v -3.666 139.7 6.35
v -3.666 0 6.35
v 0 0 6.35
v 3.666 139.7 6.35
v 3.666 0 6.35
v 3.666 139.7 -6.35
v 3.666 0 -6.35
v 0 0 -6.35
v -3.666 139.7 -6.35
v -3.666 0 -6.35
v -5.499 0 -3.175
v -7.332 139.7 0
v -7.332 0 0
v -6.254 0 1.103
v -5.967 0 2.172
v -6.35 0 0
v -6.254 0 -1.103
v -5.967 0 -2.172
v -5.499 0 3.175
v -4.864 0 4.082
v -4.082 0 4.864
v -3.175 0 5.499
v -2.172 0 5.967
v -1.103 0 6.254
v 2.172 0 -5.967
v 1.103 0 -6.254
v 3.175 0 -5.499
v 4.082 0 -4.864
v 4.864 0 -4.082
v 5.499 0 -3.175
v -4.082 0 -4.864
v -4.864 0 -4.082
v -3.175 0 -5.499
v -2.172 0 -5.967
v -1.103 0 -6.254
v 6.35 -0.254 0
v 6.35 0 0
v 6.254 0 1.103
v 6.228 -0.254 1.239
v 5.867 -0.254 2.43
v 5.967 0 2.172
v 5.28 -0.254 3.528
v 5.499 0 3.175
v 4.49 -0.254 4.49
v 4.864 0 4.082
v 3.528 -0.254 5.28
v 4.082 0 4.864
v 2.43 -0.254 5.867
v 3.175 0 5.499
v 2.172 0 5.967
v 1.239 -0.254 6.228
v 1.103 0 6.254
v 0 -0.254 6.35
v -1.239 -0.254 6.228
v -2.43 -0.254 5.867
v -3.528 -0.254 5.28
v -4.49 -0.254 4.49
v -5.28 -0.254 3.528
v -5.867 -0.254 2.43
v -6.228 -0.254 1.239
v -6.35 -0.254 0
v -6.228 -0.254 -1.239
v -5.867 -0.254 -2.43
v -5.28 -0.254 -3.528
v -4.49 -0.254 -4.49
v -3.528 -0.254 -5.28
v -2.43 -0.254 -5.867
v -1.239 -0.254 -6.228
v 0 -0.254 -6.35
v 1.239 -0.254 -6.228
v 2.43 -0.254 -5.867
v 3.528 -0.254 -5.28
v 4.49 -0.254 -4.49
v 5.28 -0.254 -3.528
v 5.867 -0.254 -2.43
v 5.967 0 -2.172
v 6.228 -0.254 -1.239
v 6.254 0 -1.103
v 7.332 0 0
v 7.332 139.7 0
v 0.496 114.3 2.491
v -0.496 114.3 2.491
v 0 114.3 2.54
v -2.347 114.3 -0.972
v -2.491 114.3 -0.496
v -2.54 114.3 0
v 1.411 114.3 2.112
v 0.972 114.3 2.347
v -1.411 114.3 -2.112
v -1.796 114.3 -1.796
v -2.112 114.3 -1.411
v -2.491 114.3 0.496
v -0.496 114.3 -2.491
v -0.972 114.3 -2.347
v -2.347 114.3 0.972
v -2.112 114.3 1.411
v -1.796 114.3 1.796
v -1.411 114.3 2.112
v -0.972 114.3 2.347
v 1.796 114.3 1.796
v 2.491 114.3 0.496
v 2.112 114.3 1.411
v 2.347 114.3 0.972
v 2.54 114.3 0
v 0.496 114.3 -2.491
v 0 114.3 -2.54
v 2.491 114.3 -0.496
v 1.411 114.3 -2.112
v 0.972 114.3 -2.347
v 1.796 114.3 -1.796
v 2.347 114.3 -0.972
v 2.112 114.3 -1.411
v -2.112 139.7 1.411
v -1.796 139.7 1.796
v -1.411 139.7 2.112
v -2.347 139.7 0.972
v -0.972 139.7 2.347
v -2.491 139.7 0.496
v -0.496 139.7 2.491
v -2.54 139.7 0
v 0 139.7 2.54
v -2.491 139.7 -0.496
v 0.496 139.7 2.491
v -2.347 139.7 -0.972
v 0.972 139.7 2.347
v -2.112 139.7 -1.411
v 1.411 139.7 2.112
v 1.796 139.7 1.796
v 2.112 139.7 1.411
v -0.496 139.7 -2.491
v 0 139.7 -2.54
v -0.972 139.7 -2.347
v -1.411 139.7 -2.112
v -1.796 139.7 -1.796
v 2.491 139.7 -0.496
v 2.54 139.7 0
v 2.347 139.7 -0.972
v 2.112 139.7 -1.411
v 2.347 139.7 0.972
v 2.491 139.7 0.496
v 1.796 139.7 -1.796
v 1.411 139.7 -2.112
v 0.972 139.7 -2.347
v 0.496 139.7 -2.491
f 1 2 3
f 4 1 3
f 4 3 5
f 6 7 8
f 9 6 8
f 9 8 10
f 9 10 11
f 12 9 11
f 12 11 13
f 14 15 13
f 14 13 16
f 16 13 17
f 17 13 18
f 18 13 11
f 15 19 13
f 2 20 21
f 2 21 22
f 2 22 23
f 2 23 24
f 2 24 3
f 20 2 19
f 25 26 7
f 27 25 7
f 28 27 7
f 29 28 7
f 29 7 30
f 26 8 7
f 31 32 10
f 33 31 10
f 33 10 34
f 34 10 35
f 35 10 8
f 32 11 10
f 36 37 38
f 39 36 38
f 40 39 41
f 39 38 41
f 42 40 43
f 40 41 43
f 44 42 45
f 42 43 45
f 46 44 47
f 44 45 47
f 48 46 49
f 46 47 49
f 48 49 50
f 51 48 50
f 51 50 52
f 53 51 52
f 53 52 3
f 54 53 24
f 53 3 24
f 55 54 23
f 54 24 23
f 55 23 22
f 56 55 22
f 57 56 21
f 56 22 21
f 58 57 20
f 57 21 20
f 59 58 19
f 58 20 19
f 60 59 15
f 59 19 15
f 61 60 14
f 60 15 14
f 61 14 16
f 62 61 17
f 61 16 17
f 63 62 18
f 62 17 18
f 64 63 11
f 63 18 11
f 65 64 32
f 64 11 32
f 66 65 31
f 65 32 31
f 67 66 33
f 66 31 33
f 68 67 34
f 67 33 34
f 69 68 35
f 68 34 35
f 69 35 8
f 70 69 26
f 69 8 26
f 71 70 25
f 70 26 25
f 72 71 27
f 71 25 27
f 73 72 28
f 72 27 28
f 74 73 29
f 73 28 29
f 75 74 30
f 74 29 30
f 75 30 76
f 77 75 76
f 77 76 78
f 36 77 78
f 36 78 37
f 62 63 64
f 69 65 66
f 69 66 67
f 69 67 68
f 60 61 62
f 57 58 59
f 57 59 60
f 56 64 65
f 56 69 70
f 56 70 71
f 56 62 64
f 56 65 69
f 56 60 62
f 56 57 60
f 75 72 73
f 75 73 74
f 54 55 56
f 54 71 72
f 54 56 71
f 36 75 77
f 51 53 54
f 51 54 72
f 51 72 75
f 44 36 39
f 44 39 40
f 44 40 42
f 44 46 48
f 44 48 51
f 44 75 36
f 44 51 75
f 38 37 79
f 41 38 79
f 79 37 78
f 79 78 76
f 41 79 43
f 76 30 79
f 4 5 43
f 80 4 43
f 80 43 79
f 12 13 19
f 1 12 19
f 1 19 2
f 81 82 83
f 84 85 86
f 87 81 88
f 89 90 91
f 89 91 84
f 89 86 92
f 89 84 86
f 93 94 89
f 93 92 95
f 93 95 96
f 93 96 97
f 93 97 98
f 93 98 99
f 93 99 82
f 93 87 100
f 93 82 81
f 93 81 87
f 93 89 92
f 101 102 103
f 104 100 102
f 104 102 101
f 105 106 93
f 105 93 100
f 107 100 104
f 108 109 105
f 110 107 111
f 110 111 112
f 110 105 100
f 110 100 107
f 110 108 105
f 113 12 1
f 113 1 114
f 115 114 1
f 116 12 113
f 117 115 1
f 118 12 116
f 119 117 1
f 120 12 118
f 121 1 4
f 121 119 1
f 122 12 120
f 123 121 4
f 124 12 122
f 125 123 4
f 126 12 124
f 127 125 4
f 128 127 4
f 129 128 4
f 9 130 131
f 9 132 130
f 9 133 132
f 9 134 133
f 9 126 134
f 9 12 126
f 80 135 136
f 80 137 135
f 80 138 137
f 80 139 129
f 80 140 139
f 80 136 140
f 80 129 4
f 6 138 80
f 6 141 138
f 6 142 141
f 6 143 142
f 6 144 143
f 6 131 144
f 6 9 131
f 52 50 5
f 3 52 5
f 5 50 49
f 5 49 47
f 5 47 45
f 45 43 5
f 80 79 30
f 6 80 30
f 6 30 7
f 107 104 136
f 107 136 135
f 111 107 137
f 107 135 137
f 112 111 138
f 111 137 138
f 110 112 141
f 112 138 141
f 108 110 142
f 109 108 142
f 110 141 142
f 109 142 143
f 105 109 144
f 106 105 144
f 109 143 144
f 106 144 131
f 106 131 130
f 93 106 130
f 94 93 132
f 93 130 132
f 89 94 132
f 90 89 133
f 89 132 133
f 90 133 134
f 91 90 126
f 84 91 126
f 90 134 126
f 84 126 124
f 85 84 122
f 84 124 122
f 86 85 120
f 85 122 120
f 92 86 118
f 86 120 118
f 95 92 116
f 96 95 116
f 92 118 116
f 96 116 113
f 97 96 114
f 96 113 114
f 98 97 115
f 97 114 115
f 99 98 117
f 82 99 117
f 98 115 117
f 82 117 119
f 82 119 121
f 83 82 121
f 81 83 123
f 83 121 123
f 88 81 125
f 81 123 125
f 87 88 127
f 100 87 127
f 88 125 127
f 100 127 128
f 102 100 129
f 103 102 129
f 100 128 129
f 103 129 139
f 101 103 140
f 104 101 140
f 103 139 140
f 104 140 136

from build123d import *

# Parameters (mm, degrees)
BOSS_EXTRUDE1_DEPTH = 139.7
SKETCH2_R           = 2.54
CUT_EXTRUDE1_DEPTH  = 25.4
SKETCH3_R           = 6.35
BOSS_EXTRUDE2_DEPTH = 0.254


with BuildPart() as part:
    # Sketch1 → Boss-Extrude1 (new body)
    with BuildSketch(Plane(origin=(0, 0, 0), x_dir=(1, 0, 0), z_dir=(0, 1, 0))):
        Polygon((7.332348419, 0), (3.666174209, 6.35), (-3.666174209, 6.35), (-7.332348419, 0), (-3.666174209, -6.35), (3.666174209, -6.35), align=None)
    extrude(amount=BOSS_EXTRUDE1_DEPTH)

    # Sketch2 → Cut-Extrude1 (cut)
    with BuildSketch(Plane(origin=(0, 139.7, 0), x_dir=(1, 0, 0), z_dir=(0, 1, 0))):
        Circle(SKETCH2_R)
    extrude(amount=-CUT_EXTRUDE1_DEPTH, mode=Mode.SUBTRACT)

    # Sketch3 → Boss-Extrude2 (add)
    with BuildSketch(Plane.XZ):
        Circle(SKETCH3_R)
    extrude(amount=BOSS_EXTRUDE2_DEPTH)


solid = part.part
